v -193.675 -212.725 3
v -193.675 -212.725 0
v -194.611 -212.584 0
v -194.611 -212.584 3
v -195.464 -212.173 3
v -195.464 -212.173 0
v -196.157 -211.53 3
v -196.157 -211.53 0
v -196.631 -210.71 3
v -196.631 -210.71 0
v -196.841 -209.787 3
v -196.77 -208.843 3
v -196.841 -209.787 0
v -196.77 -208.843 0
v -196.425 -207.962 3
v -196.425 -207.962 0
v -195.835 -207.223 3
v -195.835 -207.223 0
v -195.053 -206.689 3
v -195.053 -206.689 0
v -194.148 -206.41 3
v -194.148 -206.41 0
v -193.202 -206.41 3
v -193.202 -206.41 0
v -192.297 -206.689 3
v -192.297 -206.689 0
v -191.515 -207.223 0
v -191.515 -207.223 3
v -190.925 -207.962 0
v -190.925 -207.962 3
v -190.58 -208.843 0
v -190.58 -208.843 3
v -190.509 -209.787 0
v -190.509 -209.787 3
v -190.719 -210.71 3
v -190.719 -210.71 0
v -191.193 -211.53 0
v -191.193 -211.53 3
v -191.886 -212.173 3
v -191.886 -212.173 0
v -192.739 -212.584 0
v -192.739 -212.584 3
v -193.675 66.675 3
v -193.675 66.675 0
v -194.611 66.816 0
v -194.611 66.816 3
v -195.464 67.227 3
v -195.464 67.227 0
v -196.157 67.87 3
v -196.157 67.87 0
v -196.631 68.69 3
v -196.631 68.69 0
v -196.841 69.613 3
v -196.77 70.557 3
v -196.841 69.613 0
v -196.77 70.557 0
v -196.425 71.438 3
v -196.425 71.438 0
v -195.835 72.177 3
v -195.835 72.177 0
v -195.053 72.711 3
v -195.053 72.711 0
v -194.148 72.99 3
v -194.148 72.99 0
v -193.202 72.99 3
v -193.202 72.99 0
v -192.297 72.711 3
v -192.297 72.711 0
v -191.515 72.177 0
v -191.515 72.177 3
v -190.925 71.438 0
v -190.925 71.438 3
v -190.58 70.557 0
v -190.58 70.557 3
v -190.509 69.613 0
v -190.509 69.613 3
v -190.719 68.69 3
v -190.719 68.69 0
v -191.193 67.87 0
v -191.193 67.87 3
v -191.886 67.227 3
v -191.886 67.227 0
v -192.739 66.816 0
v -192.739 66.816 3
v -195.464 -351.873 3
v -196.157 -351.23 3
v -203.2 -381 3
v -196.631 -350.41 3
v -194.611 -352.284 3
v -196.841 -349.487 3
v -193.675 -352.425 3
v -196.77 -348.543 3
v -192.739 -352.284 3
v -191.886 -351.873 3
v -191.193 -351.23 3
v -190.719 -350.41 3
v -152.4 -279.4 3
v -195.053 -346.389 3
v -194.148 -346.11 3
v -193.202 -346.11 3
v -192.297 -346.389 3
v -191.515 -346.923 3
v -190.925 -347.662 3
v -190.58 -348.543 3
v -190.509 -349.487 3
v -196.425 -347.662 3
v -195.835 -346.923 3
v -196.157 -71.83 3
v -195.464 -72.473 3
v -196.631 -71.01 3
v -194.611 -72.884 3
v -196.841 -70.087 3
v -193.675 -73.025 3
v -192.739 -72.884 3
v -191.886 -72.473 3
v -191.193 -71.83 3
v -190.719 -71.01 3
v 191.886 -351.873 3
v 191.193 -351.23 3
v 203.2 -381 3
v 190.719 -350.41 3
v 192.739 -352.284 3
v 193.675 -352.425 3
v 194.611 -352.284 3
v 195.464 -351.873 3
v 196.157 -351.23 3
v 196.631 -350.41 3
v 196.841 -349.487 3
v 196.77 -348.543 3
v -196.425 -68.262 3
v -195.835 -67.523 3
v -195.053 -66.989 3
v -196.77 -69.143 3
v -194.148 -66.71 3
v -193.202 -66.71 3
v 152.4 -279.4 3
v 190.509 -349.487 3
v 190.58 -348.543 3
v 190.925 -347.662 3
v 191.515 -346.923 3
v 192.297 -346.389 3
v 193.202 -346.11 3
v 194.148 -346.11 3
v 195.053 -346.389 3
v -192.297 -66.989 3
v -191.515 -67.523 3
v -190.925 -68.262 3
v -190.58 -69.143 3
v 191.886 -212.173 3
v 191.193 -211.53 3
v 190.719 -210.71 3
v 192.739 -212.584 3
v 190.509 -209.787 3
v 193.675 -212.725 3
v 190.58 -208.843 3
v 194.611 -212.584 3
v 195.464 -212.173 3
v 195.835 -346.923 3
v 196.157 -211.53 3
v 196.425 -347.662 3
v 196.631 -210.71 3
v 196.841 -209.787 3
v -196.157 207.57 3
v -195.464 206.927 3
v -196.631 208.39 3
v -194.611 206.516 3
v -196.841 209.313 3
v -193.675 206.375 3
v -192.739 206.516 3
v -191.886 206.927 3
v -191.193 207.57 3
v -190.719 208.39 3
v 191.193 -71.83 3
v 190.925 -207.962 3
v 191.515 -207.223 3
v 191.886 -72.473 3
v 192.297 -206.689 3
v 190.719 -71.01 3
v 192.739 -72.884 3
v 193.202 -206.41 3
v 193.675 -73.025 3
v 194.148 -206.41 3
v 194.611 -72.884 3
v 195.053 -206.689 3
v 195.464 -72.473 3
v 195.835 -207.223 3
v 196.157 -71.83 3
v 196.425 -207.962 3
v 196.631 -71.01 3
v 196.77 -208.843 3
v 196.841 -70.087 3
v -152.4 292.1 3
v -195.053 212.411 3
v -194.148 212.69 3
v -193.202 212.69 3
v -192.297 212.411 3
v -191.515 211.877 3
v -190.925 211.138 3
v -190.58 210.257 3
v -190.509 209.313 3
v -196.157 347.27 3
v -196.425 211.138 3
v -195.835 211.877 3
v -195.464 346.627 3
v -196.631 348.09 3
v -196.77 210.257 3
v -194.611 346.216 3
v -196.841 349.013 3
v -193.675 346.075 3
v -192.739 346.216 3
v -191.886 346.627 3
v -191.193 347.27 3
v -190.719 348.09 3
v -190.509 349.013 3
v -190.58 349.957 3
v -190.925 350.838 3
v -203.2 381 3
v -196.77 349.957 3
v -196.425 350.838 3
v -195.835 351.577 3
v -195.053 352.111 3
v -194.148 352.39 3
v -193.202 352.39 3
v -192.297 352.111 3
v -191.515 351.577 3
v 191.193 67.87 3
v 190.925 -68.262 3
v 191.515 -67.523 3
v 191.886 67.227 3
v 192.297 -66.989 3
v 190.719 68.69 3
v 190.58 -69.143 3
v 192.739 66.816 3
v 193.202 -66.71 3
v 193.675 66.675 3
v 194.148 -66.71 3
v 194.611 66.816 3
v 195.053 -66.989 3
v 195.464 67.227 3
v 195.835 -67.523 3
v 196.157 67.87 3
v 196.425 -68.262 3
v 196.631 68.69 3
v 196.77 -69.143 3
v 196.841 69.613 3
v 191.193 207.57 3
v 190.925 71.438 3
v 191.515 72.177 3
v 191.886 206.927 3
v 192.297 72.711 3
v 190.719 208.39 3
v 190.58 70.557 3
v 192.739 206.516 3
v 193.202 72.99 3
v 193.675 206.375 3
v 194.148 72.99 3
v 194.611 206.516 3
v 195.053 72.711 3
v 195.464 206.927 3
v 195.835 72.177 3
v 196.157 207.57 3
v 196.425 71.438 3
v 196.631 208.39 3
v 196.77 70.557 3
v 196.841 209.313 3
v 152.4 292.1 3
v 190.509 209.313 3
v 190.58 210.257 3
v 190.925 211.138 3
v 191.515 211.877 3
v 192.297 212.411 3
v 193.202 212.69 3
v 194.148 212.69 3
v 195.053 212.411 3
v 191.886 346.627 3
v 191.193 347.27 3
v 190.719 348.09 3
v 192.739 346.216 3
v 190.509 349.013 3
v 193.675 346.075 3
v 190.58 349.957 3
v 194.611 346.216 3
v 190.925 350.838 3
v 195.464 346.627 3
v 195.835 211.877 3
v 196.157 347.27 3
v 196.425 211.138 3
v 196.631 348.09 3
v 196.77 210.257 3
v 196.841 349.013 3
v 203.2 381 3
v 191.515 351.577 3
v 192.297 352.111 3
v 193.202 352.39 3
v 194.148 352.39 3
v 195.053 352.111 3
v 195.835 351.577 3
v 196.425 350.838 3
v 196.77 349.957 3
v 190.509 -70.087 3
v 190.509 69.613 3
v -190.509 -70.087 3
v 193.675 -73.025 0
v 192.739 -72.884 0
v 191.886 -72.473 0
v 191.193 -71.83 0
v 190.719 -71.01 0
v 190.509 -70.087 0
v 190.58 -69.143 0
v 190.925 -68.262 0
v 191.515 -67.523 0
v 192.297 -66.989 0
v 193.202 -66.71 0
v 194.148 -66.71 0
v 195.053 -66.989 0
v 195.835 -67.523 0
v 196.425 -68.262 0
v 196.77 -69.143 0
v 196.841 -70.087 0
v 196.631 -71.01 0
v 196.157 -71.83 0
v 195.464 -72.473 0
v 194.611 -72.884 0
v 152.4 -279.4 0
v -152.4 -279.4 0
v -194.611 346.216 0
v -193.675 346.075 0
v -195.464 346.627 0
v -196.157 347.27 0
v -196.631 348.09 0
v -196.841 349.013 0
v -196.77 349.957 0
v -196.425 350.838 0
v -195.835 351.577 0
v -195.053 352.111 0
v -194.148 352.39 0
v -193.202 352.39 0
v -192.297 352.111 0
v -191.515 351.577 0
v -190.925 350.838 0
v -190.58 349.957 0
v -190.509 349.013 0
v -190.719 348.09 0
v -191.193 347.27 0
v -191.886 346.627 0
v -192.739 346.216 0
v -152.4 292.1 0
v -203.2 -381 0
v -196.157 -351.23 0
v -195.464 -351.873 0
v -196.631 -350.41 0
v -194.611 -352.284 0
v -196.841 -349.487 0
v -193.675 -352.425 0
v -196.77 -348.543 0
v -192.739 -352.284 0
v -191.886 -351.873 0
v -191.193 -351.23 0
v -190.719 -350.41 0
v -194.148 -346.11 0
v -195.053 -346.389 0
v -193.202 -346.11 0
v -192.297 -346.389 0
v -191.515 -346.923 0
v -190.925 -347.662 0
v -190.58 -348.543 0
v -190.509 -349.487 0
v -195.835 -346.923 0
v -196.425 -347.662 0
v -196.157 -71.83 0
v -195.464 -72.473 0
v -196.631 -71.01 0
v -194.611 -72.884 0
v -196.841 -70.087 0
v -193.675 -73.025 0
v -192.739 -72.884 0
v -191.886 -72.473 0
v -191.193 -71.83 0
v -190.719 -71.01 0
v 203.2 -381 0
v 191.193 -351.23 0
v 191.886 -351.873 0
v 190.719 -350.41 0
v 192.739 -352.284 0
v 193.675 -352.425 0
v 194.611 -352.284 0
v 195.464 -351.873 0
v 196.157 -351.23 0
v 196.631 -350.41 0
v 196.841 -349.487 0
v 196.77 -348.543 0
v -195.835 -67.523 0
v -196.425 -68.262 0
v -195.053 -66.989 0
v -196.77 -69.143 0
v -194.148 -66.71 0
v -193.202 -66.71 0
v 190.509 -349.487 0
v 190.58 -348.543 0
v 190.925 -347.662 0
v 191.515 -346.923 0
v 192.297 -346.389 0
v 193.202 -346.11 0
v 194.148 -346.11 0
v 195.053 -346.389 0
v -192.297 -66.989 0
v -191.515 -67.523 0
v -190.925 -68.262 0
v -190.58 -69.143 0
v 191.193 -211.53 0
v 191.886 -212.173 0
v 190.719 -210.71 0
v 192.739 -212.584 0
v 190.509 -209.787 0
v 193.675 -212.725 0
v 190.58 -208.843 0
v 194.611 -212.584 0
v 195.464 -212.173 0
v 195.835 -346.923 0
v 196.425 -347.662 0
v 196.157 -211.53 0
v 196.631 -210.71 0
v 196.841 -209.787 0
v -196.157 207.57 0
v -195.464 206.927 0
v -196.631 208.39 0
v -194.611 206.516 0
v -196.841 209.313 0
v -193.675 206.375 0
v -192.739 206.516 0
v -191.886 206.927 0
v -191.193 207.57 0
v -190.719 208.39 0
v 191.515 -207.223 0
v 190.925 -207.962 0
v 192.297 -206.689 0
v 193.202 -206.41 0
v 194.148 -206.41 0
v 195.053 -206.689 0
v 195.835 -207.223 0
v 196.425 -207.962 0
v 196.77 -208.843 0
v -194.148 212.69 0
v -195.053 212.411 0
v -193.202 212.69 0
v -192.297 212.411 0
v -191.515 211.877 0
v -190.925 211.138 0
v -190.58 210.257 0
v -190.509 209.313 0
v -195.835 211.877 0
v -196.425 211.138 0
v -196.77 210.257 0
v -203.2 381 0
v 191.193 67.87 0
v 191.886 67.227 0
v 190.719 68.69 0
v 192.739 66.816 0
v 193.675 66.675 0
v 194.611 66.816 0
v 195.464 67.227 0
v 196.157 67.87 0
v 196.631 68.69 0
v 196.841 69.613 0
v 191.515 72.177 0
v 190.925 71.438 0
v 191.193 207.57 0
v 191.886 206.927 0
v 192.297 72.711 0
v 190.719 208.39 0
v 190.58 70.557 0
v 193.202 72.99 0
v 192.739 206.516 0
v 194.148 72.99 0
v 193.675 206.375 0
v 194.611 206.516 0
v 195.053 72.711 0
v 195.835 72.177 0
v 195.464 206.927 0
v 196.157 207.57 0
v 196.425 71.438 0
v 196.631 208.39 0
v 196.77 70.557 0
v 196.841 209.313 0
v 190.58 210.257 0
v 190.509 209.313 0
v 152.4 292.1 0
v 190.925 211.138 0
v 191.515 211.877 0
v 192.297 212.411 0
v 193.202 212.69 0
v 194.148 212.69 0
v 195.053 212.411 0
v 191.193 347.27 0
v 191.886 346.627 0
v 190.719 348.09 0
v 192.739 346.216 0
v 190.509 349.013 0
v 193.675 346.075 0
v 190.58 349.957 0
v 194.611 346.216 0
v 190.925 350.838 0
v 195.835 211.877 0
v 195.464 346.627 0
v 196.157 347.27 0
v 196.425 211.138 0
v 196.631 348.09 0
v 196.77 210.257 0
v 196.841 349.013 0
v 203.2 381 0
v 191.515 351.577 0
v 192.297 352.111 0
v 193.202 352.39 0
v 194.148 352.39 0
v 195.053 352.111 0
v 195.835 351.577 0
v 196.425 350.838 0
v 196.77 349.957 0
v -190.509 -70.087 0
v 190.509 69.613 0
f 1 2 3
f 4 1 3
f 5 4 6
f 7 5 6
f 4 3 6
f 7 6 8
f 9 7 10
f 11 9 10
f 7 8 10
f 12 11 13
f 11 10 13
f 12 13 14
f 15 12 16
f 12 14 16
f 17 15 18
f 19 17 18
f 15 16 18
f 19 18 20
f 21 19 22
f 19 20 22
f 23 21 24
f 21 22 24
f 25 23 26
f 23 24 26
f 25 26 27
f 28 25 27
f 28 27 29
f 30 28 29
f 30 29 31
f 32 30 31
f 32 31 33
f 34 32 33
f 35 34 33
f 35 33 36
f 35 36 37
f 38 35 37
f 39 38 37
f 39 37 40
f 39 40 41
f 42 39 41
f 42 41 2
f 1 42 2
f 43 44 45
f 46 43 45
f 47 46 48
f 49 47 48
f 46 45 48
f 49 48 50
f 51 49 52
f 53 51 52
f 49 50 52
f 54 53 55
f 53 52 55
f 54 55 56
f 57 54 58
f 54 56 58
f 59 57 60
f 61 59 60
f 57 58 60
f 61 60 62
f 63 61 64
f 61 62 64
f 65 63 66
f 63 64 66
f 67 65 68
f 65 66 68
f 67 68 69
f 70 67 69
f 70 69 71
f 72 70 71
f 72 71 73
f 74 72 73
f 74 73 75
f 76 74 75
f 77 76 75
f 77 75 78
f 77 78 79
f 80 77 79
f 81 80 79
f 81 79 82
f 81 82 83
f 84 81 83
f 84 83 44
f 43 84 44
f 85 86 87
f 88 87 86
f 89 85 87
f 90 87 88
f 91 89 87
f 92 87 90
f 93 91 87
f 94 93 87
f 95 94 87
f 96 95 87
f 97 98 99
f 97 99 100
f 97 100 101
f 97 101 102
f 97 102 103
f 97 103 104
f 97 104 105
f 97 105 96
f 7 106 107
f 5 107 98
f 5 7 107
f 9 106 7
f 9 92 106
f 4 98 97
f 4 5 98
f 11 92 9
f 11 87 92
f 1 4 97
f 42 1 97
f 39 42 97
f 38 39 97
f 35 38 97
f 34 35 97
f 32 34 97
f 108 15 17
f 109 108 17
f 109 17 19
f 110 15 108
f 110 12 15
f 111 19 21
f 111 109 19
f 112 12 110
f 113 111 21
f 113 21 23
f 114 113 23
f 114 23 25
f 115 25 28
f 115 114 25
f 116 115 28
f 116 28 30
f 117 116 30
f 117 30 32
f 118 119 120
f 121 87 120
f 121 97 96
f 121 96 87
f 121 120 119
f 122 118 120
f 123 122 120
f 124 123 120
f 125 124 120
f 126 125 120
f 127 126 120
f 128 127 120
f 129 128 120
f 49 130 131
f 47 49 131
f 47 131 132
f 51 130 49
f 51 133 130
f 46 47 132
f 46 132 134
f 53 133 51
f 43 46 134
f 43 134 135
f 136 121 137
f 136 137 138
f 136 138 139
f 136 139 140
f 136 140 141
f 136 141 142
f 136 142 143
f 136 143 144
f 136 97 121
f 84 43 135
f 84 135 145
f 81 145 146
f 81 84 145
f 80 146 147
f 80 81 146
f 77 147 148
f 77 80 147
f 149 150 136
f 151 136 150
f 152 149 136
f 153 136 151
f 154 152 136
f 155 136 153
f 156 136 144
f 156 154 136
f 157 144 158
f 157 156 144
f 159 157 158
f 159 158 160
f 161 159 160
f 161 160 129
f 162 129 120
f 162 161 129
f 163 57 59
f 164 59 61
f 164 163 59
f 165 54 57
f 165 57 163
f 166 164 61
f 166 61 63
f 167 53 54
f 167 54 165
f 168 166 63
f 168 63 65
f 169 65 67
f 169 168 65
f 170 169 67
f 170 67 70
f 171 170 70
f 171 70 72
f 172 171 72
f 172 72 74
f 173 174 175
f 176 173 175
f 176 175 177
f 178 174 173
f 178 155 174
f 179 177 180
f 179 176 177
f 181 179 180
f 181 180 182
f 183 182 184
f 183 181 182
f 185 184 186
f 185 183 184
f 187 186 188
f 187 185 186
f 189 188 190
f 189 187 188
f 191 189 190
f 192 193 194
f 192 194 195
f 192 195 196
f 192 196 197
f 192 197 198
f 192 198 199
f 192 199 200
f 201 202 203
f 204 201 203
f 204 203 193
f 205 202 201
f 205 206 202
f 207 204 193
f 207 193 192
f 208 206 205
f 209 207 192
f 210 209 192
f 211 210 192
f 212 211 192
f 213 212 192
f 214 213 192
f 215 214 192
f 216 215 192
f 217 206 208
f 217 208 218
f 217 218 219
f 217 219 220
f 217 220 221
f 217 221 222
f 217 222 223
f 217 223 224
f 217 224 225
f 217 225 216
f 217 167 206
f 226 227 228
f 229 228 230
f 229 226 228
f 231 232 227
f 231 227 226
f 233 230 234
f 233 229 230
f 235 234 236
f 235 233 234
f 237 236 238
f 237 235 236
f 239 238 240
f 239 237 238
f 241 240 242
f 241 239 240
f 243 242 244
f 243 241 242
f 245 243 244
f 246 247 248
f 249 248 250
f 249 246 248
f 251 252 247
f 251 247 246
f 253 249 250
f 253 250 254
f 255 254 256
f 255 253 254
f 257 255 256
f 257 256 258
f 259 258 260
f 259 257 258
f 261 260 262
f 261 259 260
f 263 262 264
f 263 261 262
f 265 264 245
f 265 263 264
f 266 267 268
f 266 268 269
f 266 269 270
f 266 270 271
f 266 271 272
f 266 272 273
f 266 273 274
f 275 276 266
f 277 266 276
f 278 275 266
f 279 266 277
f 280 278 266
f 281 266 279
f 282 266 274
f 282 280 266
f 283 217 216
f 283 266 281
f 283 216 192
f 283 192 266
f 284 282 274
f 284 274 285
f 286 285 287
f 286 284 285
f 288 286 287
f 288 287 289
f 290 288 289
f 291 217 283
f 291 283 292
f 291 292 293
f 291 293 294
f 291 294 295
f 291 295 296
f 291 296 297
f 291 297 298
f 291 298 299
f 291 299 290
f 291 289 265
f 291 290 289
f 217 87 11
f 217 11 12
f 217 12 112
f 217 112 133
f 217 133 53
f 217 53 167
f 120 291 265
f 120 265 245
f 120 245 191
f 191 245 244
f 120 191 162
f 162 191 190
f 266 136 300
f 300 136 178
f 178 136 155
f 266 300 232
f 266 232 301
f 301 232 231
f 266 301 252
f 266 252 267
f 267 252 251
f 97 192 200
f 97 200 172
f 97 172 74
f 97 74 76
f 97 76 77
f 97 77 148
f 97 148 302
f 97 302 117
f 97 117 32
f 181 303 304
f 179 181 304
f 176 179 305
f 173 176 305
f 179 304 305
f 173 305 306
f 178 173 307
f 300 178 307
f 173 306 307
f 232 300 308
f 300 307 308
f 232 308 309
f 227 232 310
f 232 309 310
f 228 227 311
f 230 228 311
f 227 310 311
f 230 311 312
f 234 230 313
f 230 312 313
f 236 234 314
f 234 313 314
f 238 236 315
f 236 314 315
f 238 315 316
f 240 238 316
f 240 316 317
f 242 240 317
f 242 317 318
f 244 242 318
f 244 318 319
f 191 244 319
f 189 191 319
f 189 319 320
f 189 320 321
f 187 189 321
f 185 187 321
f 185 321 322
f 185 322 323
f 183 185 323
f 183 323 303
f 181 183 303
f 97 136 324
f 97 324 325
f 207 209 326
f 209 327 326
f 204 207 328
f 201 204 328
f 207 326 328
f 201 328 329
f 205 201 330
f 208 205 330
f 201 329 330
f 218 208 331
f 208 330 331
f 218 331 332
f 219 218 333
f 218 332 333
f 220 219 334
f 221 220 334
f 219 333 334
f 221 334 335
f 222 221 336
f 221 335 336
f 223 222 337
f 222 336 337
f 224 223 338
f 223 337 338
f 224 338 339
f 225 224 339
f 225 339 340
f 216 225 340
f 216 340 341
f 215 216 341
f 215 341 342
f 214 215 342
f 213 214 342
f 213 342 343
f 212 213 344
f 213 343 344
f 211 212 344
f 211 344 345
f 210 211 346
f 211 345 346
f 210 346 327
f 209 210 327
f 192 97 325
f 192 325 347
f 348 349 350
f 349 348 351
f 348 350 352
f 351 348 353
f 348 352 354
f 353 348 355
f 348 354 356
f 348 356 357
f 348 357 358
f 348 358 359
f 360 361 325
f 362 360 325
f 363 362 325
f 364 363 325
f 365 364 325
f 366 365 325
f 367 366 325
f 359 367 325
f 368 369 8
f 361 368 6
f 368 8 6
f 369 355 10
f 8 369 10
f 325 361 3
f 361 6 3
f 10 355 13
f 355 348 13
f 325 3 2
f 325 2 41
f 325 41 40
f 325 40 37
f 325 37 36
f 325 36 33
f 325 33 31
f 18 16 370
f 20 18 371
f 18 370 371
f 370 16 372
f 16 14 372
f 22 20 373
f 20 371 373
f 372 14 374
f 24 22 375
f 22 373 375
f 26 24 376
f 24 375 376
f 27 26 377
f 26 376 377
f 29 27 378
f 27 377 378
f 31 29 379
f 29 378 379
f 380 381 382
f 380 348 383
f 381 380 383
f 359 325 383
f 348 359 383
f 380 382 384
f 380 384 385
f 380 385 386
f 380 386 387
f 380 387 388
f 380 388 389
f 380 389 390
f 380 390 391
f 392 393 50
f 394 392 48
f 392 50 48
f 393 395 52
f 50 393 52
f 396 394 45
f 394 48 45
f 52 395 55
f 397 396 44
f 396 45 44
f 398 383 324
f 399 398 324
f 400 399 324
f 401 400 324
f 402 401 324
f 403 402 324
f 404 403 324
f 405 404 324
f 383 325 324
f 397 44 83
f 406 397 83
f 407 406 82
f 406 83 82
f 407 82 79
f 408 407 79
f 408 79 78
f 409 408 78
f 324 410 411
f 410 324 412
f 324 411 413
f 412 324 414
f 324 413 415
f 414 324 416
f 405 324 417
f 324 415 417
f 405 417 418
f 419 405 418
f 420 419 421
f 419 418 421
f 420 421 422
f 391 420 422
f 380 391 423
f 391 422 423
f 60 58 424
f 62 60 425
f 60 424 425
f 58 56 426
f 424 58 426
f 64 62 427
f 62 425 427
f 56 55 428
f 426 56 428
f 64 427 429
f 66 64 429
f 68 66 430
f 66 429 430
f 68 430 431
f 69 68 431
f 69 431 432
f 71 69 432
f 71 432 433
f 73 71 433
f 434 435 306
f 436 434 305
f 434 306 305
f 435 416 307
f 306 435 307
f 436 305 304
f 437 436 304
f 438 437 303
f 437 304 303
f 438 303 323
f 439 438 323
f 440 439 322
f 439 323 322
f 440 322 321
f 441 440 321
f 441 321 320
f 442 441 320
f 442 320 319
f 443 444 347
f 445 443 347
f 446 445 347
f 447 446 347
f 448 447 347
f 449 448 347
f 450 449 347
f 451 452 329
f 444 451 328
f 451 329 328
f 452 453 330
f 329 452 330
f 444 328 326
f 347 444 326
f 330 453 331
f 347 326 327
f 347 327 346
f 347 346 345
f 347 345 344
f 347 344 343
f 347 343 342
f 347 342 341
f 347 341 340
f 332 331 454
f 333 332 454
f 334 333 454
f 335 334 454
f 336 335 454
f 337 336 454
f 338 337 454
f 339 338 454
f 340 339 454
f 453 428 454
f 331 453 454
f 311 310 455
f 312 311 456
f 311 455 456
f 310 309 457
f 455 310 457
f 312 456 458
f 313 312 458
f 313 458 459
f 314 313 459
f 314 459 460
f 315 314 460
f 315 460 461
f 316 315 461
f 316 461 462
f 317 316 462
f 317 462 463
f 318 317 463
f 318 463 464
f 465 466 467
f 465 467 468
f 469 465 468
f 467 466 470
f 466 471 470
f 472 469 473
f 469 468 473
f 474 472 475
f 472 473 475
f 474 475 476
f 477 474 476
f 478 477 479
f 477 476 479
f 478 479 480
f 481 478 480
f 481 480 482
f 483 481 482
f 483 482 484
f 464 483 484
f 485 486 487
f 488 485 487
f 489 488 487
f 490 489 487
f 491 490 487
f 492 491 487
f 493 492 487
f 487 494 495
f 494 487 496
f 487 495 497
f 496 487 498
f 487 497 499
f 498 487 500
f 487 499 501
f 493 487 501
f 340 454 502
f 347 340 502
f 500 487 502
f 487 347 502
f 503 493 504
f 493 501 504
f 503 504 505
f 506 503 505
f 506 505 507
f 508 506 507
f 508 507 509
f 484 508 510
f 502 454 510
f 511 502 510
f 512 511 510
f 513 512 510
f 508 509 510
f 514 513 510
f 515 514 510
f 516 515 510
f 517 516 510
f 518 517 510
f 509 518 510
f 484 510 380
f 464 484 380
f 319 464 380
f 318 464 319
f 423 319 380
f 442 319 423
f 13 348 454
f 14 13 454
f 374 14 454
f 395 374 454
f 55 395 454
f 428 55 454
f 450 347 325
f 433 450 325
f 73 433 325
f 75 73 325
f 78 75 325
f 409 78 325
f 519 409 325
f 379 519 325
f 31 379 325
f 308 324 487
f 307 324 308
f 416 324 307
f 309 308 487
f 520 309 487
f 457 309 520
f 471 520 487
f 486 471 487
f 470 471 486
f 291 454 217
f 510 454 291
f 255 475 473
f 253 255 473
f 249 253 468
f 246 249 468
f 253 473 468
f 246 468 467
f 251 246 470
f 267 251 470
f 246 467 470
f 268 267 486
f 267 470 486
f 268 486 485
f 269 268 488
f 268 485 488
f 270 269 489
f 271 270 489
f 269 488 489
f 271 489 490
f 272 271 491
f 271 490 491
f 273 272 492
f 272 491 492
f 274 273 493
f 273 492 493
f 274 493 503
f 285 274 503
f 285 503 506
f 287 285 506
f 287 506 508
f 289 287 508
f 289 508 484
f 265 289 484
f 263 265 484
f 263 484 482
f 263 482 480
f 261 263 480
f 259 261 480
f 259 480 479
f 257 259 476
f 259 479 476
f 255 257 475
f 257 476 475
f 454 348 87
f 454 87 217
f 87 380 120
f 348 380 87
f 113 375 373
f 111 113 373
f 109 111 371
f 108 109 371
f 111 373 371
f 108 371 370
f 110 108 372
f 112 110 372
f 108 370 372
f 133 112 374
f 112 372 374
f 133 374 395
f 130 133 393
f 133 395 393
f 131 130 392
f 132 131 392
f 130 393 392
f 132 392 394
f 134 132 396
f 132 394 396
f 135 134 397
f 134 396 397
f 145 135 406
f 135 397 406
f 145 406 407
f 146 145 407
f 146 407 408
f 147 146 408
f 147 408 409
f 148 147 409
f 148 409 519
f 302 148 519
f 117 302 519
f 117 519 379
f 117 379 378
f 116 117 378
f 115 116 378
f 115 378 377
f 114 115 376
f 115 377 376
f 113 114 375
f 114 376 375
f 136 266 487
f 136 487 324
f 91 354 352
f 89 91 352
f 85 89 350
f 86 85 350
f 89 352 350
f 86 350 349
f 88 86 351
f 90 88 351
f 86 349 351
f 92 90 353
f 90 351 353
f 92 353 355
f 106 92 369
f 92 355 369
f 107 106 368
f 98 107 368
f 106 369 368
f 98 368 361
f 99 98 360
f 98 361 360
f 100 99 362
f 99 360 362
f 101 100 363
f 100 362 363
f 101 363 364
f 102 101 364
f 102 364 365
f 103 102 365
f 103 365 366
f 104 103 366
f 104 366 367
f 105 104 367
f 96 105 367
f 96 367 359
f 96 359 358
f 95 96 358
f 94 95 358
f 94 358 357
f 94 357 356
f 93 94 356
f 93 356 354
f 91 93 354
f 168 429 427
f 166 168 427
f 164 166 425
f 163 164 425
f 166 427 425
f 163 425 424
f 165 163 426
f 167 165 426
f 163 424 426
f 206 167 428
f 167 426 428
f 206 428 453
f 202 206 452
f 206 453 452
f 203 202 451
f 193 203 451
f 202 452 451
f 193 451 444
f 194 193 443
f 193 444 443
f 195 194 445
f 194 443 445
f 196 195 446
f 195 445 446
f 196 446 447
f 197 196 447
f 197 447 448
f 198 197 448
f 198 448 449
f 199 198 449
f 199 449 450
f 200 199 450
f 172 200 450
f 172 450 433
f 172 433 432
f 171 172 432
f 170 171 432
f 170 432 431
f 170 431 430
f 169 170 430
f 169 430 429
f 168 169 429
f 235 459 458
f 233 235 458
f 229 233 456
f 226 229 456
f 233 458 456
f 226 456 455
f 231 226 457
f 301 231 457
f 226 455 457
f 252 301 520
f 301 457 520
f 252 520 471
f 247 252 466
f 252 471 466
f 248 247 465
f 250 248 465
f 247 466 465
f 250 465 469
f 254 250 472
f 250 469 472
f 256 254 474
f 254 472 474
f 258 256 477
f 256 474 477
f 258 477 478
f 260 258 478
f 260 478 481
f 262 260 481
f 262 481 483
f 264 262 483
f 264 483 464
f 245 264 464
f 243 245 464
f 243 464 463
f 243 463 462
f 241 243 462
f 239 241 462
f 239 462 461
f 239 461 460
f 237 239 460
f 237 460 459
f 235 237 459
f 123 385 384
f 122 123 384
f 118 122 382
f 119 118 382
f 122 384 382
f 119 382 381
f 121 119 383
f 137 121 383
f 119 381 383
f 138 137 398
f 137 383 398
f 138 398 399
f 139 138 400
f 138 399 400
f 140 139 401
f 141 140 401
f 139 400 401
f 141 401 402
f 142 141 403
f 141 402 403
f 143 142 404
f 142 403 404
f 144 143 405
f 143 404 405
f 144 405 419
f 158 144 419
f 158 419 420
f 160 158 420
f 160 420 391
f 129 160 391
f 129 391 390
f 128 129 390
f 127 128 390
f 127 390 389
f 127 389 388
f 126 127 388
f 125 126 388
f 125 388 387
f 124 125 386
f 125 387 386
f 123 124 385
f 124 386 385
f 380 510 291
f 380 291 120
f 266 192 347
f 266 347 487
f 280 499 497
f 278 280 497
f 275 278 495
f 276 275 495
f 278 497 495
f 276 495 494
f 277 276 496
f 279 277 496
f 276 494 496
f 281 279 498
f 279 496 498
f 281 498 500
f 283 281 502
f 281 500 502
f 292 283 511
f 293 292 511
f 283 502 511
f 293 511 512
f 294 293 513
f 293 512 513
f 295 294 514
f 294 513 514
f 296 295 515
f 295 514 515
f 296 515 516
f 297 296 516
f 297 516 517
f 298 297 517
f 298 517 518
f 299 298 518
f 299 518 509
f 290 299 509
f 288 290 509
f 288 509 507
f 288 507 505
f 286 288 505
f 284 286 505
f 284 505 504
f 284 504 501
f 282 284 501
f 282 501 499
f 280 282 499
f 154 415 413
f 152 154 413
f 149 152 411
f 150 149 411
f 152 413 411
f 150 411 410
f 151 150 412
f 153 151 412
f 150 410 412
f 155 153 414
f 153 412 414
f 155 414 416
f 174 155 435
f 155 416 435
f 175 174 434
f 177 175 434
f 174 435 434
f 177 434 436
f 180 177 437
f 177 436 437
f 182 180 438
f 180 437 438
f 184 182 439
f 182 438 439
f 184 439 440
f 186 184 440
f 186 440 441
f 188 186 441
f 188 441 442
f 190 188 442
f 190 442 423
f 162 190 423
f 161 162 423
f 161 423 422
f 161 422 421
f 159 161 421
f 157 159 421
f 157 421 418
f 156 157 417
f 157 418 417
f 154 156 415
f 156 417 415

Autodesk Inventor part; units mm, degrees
ref_plane "YZ Plane" through (0, 0, 0) normal (1, 0, 0) x (0, 1, 0)
ref_plane "XZ Plane" through (0, 0, 0) normal (0, 1, 0) x (-1, 0, 0)
ref_plane "XY Plane" through (0, 0, 0) normal (0, 0, 1) x (1, 0, 0)
sketch "Sketch1" plane through (0, 0, 0) normal (0, 0, 1) x (1, 0, 0)
  line L0 (-203.2, 381) -> (203.2, 381)
  line L1 (203.2, 381) -> (203.2, -381)
  line L2 (203.2, -381) -> (-203.2, -381)
  line L3 (-203.2, -381) -> (-203.2, 381)
  point P0 (0, 0)
  point P1 (203.2, 0)
  point P2 (0, 381)
  dimension "d0" = 406.4
  dimension "d1" = 762
extrude "Extrusion1" add sketch "Sketch1" along normal blind 3
sketch "Sketch2" plane through (0, 0, 3) normal (0, 0, 1) x (1, 0, 0)
  line L0 (203.2, 381) -> (203.2, -381) projected
  line L1 (-203.2, -381) -> (-203.2, 381) projected
  line L2 (203.2, -381) -> (-203.2, -381) projected
  line L3 (-152.4, 292.1) -> (152.4, 292.1)
  line L4 (152.4, 292.1) -> (152.4, -279.4)
  line L5 (152.4, -279.4) -> (-152.4, -279.4)
  line L6 (-152.4, -279.4) -> (-152.4, 292.1)
  point P0 (0, 0)
  dimension "d4" = 101.6
  dimension "d5" = 50.8
  dimension "d6" = 571.5
  dimension "d7" = 50.8
extrude "Extrusion2" cut sketch "Sketch2" against normal blind 3
sketch "Sketch3" plane through (0, 0, 3) normal (0, 0, 1) x (1, 0, 0)
  line L0 (-203.2, 381) -> (203.2, 381) projected
  line L1 (-203.2, -381) -> (-203.2, 381) projected
  line L2 (203.2, -381) -> (-203.2, -381) projected
  line L3 (0, 473.1075) -> (0, -607.181)
  point P0 (0, 0)
  point P1 (-193.675, 349.25)
  point P2 (-193.675, 209.55)
  point P3 (-193.675, 69.85)
  point P4 (-193.675, -69.85)
  point P5 (-193.675, -209.55)
  point P6 (-193.675, -349.25)
  point P7 (193.675, 349.25)
  point P8 (193.675, 209.55)
  point P9 (193.675, 69.85)
  point P10 (193.675, -69.85)
  point P11 (193.675, -209.55)
  point P12 (193.675, -349.25)
  dimension "d10" = 31.75
  dimension "d11" = 9.525
  dimension "d25" = 139.7
  dimension "d26" = 139.7
  dimension "d27" = 139.7
  dimension "d28" = 139.7
  dimension "d29" = 139.7
hole "Hole2" at (-193.675, 349.25, 3) at (-193.675, 209.55, 3) at (-193.675, 69.85, 3) at (-193.675, -69.85, 3) at (-193.675, -209.55, 3) at (-193.675, -349.25, 3) at (193.675, 349.25, 3) at (193.675, 209.55, 3) at (193.675, 69.85, 3) at (193.675, -69.85, 3) at (193.675, -209.55, 3) at (193.675, -349.25, 3) direction (0, 0, -1) diameter 6.35 end through all
properties part number "front cover"
